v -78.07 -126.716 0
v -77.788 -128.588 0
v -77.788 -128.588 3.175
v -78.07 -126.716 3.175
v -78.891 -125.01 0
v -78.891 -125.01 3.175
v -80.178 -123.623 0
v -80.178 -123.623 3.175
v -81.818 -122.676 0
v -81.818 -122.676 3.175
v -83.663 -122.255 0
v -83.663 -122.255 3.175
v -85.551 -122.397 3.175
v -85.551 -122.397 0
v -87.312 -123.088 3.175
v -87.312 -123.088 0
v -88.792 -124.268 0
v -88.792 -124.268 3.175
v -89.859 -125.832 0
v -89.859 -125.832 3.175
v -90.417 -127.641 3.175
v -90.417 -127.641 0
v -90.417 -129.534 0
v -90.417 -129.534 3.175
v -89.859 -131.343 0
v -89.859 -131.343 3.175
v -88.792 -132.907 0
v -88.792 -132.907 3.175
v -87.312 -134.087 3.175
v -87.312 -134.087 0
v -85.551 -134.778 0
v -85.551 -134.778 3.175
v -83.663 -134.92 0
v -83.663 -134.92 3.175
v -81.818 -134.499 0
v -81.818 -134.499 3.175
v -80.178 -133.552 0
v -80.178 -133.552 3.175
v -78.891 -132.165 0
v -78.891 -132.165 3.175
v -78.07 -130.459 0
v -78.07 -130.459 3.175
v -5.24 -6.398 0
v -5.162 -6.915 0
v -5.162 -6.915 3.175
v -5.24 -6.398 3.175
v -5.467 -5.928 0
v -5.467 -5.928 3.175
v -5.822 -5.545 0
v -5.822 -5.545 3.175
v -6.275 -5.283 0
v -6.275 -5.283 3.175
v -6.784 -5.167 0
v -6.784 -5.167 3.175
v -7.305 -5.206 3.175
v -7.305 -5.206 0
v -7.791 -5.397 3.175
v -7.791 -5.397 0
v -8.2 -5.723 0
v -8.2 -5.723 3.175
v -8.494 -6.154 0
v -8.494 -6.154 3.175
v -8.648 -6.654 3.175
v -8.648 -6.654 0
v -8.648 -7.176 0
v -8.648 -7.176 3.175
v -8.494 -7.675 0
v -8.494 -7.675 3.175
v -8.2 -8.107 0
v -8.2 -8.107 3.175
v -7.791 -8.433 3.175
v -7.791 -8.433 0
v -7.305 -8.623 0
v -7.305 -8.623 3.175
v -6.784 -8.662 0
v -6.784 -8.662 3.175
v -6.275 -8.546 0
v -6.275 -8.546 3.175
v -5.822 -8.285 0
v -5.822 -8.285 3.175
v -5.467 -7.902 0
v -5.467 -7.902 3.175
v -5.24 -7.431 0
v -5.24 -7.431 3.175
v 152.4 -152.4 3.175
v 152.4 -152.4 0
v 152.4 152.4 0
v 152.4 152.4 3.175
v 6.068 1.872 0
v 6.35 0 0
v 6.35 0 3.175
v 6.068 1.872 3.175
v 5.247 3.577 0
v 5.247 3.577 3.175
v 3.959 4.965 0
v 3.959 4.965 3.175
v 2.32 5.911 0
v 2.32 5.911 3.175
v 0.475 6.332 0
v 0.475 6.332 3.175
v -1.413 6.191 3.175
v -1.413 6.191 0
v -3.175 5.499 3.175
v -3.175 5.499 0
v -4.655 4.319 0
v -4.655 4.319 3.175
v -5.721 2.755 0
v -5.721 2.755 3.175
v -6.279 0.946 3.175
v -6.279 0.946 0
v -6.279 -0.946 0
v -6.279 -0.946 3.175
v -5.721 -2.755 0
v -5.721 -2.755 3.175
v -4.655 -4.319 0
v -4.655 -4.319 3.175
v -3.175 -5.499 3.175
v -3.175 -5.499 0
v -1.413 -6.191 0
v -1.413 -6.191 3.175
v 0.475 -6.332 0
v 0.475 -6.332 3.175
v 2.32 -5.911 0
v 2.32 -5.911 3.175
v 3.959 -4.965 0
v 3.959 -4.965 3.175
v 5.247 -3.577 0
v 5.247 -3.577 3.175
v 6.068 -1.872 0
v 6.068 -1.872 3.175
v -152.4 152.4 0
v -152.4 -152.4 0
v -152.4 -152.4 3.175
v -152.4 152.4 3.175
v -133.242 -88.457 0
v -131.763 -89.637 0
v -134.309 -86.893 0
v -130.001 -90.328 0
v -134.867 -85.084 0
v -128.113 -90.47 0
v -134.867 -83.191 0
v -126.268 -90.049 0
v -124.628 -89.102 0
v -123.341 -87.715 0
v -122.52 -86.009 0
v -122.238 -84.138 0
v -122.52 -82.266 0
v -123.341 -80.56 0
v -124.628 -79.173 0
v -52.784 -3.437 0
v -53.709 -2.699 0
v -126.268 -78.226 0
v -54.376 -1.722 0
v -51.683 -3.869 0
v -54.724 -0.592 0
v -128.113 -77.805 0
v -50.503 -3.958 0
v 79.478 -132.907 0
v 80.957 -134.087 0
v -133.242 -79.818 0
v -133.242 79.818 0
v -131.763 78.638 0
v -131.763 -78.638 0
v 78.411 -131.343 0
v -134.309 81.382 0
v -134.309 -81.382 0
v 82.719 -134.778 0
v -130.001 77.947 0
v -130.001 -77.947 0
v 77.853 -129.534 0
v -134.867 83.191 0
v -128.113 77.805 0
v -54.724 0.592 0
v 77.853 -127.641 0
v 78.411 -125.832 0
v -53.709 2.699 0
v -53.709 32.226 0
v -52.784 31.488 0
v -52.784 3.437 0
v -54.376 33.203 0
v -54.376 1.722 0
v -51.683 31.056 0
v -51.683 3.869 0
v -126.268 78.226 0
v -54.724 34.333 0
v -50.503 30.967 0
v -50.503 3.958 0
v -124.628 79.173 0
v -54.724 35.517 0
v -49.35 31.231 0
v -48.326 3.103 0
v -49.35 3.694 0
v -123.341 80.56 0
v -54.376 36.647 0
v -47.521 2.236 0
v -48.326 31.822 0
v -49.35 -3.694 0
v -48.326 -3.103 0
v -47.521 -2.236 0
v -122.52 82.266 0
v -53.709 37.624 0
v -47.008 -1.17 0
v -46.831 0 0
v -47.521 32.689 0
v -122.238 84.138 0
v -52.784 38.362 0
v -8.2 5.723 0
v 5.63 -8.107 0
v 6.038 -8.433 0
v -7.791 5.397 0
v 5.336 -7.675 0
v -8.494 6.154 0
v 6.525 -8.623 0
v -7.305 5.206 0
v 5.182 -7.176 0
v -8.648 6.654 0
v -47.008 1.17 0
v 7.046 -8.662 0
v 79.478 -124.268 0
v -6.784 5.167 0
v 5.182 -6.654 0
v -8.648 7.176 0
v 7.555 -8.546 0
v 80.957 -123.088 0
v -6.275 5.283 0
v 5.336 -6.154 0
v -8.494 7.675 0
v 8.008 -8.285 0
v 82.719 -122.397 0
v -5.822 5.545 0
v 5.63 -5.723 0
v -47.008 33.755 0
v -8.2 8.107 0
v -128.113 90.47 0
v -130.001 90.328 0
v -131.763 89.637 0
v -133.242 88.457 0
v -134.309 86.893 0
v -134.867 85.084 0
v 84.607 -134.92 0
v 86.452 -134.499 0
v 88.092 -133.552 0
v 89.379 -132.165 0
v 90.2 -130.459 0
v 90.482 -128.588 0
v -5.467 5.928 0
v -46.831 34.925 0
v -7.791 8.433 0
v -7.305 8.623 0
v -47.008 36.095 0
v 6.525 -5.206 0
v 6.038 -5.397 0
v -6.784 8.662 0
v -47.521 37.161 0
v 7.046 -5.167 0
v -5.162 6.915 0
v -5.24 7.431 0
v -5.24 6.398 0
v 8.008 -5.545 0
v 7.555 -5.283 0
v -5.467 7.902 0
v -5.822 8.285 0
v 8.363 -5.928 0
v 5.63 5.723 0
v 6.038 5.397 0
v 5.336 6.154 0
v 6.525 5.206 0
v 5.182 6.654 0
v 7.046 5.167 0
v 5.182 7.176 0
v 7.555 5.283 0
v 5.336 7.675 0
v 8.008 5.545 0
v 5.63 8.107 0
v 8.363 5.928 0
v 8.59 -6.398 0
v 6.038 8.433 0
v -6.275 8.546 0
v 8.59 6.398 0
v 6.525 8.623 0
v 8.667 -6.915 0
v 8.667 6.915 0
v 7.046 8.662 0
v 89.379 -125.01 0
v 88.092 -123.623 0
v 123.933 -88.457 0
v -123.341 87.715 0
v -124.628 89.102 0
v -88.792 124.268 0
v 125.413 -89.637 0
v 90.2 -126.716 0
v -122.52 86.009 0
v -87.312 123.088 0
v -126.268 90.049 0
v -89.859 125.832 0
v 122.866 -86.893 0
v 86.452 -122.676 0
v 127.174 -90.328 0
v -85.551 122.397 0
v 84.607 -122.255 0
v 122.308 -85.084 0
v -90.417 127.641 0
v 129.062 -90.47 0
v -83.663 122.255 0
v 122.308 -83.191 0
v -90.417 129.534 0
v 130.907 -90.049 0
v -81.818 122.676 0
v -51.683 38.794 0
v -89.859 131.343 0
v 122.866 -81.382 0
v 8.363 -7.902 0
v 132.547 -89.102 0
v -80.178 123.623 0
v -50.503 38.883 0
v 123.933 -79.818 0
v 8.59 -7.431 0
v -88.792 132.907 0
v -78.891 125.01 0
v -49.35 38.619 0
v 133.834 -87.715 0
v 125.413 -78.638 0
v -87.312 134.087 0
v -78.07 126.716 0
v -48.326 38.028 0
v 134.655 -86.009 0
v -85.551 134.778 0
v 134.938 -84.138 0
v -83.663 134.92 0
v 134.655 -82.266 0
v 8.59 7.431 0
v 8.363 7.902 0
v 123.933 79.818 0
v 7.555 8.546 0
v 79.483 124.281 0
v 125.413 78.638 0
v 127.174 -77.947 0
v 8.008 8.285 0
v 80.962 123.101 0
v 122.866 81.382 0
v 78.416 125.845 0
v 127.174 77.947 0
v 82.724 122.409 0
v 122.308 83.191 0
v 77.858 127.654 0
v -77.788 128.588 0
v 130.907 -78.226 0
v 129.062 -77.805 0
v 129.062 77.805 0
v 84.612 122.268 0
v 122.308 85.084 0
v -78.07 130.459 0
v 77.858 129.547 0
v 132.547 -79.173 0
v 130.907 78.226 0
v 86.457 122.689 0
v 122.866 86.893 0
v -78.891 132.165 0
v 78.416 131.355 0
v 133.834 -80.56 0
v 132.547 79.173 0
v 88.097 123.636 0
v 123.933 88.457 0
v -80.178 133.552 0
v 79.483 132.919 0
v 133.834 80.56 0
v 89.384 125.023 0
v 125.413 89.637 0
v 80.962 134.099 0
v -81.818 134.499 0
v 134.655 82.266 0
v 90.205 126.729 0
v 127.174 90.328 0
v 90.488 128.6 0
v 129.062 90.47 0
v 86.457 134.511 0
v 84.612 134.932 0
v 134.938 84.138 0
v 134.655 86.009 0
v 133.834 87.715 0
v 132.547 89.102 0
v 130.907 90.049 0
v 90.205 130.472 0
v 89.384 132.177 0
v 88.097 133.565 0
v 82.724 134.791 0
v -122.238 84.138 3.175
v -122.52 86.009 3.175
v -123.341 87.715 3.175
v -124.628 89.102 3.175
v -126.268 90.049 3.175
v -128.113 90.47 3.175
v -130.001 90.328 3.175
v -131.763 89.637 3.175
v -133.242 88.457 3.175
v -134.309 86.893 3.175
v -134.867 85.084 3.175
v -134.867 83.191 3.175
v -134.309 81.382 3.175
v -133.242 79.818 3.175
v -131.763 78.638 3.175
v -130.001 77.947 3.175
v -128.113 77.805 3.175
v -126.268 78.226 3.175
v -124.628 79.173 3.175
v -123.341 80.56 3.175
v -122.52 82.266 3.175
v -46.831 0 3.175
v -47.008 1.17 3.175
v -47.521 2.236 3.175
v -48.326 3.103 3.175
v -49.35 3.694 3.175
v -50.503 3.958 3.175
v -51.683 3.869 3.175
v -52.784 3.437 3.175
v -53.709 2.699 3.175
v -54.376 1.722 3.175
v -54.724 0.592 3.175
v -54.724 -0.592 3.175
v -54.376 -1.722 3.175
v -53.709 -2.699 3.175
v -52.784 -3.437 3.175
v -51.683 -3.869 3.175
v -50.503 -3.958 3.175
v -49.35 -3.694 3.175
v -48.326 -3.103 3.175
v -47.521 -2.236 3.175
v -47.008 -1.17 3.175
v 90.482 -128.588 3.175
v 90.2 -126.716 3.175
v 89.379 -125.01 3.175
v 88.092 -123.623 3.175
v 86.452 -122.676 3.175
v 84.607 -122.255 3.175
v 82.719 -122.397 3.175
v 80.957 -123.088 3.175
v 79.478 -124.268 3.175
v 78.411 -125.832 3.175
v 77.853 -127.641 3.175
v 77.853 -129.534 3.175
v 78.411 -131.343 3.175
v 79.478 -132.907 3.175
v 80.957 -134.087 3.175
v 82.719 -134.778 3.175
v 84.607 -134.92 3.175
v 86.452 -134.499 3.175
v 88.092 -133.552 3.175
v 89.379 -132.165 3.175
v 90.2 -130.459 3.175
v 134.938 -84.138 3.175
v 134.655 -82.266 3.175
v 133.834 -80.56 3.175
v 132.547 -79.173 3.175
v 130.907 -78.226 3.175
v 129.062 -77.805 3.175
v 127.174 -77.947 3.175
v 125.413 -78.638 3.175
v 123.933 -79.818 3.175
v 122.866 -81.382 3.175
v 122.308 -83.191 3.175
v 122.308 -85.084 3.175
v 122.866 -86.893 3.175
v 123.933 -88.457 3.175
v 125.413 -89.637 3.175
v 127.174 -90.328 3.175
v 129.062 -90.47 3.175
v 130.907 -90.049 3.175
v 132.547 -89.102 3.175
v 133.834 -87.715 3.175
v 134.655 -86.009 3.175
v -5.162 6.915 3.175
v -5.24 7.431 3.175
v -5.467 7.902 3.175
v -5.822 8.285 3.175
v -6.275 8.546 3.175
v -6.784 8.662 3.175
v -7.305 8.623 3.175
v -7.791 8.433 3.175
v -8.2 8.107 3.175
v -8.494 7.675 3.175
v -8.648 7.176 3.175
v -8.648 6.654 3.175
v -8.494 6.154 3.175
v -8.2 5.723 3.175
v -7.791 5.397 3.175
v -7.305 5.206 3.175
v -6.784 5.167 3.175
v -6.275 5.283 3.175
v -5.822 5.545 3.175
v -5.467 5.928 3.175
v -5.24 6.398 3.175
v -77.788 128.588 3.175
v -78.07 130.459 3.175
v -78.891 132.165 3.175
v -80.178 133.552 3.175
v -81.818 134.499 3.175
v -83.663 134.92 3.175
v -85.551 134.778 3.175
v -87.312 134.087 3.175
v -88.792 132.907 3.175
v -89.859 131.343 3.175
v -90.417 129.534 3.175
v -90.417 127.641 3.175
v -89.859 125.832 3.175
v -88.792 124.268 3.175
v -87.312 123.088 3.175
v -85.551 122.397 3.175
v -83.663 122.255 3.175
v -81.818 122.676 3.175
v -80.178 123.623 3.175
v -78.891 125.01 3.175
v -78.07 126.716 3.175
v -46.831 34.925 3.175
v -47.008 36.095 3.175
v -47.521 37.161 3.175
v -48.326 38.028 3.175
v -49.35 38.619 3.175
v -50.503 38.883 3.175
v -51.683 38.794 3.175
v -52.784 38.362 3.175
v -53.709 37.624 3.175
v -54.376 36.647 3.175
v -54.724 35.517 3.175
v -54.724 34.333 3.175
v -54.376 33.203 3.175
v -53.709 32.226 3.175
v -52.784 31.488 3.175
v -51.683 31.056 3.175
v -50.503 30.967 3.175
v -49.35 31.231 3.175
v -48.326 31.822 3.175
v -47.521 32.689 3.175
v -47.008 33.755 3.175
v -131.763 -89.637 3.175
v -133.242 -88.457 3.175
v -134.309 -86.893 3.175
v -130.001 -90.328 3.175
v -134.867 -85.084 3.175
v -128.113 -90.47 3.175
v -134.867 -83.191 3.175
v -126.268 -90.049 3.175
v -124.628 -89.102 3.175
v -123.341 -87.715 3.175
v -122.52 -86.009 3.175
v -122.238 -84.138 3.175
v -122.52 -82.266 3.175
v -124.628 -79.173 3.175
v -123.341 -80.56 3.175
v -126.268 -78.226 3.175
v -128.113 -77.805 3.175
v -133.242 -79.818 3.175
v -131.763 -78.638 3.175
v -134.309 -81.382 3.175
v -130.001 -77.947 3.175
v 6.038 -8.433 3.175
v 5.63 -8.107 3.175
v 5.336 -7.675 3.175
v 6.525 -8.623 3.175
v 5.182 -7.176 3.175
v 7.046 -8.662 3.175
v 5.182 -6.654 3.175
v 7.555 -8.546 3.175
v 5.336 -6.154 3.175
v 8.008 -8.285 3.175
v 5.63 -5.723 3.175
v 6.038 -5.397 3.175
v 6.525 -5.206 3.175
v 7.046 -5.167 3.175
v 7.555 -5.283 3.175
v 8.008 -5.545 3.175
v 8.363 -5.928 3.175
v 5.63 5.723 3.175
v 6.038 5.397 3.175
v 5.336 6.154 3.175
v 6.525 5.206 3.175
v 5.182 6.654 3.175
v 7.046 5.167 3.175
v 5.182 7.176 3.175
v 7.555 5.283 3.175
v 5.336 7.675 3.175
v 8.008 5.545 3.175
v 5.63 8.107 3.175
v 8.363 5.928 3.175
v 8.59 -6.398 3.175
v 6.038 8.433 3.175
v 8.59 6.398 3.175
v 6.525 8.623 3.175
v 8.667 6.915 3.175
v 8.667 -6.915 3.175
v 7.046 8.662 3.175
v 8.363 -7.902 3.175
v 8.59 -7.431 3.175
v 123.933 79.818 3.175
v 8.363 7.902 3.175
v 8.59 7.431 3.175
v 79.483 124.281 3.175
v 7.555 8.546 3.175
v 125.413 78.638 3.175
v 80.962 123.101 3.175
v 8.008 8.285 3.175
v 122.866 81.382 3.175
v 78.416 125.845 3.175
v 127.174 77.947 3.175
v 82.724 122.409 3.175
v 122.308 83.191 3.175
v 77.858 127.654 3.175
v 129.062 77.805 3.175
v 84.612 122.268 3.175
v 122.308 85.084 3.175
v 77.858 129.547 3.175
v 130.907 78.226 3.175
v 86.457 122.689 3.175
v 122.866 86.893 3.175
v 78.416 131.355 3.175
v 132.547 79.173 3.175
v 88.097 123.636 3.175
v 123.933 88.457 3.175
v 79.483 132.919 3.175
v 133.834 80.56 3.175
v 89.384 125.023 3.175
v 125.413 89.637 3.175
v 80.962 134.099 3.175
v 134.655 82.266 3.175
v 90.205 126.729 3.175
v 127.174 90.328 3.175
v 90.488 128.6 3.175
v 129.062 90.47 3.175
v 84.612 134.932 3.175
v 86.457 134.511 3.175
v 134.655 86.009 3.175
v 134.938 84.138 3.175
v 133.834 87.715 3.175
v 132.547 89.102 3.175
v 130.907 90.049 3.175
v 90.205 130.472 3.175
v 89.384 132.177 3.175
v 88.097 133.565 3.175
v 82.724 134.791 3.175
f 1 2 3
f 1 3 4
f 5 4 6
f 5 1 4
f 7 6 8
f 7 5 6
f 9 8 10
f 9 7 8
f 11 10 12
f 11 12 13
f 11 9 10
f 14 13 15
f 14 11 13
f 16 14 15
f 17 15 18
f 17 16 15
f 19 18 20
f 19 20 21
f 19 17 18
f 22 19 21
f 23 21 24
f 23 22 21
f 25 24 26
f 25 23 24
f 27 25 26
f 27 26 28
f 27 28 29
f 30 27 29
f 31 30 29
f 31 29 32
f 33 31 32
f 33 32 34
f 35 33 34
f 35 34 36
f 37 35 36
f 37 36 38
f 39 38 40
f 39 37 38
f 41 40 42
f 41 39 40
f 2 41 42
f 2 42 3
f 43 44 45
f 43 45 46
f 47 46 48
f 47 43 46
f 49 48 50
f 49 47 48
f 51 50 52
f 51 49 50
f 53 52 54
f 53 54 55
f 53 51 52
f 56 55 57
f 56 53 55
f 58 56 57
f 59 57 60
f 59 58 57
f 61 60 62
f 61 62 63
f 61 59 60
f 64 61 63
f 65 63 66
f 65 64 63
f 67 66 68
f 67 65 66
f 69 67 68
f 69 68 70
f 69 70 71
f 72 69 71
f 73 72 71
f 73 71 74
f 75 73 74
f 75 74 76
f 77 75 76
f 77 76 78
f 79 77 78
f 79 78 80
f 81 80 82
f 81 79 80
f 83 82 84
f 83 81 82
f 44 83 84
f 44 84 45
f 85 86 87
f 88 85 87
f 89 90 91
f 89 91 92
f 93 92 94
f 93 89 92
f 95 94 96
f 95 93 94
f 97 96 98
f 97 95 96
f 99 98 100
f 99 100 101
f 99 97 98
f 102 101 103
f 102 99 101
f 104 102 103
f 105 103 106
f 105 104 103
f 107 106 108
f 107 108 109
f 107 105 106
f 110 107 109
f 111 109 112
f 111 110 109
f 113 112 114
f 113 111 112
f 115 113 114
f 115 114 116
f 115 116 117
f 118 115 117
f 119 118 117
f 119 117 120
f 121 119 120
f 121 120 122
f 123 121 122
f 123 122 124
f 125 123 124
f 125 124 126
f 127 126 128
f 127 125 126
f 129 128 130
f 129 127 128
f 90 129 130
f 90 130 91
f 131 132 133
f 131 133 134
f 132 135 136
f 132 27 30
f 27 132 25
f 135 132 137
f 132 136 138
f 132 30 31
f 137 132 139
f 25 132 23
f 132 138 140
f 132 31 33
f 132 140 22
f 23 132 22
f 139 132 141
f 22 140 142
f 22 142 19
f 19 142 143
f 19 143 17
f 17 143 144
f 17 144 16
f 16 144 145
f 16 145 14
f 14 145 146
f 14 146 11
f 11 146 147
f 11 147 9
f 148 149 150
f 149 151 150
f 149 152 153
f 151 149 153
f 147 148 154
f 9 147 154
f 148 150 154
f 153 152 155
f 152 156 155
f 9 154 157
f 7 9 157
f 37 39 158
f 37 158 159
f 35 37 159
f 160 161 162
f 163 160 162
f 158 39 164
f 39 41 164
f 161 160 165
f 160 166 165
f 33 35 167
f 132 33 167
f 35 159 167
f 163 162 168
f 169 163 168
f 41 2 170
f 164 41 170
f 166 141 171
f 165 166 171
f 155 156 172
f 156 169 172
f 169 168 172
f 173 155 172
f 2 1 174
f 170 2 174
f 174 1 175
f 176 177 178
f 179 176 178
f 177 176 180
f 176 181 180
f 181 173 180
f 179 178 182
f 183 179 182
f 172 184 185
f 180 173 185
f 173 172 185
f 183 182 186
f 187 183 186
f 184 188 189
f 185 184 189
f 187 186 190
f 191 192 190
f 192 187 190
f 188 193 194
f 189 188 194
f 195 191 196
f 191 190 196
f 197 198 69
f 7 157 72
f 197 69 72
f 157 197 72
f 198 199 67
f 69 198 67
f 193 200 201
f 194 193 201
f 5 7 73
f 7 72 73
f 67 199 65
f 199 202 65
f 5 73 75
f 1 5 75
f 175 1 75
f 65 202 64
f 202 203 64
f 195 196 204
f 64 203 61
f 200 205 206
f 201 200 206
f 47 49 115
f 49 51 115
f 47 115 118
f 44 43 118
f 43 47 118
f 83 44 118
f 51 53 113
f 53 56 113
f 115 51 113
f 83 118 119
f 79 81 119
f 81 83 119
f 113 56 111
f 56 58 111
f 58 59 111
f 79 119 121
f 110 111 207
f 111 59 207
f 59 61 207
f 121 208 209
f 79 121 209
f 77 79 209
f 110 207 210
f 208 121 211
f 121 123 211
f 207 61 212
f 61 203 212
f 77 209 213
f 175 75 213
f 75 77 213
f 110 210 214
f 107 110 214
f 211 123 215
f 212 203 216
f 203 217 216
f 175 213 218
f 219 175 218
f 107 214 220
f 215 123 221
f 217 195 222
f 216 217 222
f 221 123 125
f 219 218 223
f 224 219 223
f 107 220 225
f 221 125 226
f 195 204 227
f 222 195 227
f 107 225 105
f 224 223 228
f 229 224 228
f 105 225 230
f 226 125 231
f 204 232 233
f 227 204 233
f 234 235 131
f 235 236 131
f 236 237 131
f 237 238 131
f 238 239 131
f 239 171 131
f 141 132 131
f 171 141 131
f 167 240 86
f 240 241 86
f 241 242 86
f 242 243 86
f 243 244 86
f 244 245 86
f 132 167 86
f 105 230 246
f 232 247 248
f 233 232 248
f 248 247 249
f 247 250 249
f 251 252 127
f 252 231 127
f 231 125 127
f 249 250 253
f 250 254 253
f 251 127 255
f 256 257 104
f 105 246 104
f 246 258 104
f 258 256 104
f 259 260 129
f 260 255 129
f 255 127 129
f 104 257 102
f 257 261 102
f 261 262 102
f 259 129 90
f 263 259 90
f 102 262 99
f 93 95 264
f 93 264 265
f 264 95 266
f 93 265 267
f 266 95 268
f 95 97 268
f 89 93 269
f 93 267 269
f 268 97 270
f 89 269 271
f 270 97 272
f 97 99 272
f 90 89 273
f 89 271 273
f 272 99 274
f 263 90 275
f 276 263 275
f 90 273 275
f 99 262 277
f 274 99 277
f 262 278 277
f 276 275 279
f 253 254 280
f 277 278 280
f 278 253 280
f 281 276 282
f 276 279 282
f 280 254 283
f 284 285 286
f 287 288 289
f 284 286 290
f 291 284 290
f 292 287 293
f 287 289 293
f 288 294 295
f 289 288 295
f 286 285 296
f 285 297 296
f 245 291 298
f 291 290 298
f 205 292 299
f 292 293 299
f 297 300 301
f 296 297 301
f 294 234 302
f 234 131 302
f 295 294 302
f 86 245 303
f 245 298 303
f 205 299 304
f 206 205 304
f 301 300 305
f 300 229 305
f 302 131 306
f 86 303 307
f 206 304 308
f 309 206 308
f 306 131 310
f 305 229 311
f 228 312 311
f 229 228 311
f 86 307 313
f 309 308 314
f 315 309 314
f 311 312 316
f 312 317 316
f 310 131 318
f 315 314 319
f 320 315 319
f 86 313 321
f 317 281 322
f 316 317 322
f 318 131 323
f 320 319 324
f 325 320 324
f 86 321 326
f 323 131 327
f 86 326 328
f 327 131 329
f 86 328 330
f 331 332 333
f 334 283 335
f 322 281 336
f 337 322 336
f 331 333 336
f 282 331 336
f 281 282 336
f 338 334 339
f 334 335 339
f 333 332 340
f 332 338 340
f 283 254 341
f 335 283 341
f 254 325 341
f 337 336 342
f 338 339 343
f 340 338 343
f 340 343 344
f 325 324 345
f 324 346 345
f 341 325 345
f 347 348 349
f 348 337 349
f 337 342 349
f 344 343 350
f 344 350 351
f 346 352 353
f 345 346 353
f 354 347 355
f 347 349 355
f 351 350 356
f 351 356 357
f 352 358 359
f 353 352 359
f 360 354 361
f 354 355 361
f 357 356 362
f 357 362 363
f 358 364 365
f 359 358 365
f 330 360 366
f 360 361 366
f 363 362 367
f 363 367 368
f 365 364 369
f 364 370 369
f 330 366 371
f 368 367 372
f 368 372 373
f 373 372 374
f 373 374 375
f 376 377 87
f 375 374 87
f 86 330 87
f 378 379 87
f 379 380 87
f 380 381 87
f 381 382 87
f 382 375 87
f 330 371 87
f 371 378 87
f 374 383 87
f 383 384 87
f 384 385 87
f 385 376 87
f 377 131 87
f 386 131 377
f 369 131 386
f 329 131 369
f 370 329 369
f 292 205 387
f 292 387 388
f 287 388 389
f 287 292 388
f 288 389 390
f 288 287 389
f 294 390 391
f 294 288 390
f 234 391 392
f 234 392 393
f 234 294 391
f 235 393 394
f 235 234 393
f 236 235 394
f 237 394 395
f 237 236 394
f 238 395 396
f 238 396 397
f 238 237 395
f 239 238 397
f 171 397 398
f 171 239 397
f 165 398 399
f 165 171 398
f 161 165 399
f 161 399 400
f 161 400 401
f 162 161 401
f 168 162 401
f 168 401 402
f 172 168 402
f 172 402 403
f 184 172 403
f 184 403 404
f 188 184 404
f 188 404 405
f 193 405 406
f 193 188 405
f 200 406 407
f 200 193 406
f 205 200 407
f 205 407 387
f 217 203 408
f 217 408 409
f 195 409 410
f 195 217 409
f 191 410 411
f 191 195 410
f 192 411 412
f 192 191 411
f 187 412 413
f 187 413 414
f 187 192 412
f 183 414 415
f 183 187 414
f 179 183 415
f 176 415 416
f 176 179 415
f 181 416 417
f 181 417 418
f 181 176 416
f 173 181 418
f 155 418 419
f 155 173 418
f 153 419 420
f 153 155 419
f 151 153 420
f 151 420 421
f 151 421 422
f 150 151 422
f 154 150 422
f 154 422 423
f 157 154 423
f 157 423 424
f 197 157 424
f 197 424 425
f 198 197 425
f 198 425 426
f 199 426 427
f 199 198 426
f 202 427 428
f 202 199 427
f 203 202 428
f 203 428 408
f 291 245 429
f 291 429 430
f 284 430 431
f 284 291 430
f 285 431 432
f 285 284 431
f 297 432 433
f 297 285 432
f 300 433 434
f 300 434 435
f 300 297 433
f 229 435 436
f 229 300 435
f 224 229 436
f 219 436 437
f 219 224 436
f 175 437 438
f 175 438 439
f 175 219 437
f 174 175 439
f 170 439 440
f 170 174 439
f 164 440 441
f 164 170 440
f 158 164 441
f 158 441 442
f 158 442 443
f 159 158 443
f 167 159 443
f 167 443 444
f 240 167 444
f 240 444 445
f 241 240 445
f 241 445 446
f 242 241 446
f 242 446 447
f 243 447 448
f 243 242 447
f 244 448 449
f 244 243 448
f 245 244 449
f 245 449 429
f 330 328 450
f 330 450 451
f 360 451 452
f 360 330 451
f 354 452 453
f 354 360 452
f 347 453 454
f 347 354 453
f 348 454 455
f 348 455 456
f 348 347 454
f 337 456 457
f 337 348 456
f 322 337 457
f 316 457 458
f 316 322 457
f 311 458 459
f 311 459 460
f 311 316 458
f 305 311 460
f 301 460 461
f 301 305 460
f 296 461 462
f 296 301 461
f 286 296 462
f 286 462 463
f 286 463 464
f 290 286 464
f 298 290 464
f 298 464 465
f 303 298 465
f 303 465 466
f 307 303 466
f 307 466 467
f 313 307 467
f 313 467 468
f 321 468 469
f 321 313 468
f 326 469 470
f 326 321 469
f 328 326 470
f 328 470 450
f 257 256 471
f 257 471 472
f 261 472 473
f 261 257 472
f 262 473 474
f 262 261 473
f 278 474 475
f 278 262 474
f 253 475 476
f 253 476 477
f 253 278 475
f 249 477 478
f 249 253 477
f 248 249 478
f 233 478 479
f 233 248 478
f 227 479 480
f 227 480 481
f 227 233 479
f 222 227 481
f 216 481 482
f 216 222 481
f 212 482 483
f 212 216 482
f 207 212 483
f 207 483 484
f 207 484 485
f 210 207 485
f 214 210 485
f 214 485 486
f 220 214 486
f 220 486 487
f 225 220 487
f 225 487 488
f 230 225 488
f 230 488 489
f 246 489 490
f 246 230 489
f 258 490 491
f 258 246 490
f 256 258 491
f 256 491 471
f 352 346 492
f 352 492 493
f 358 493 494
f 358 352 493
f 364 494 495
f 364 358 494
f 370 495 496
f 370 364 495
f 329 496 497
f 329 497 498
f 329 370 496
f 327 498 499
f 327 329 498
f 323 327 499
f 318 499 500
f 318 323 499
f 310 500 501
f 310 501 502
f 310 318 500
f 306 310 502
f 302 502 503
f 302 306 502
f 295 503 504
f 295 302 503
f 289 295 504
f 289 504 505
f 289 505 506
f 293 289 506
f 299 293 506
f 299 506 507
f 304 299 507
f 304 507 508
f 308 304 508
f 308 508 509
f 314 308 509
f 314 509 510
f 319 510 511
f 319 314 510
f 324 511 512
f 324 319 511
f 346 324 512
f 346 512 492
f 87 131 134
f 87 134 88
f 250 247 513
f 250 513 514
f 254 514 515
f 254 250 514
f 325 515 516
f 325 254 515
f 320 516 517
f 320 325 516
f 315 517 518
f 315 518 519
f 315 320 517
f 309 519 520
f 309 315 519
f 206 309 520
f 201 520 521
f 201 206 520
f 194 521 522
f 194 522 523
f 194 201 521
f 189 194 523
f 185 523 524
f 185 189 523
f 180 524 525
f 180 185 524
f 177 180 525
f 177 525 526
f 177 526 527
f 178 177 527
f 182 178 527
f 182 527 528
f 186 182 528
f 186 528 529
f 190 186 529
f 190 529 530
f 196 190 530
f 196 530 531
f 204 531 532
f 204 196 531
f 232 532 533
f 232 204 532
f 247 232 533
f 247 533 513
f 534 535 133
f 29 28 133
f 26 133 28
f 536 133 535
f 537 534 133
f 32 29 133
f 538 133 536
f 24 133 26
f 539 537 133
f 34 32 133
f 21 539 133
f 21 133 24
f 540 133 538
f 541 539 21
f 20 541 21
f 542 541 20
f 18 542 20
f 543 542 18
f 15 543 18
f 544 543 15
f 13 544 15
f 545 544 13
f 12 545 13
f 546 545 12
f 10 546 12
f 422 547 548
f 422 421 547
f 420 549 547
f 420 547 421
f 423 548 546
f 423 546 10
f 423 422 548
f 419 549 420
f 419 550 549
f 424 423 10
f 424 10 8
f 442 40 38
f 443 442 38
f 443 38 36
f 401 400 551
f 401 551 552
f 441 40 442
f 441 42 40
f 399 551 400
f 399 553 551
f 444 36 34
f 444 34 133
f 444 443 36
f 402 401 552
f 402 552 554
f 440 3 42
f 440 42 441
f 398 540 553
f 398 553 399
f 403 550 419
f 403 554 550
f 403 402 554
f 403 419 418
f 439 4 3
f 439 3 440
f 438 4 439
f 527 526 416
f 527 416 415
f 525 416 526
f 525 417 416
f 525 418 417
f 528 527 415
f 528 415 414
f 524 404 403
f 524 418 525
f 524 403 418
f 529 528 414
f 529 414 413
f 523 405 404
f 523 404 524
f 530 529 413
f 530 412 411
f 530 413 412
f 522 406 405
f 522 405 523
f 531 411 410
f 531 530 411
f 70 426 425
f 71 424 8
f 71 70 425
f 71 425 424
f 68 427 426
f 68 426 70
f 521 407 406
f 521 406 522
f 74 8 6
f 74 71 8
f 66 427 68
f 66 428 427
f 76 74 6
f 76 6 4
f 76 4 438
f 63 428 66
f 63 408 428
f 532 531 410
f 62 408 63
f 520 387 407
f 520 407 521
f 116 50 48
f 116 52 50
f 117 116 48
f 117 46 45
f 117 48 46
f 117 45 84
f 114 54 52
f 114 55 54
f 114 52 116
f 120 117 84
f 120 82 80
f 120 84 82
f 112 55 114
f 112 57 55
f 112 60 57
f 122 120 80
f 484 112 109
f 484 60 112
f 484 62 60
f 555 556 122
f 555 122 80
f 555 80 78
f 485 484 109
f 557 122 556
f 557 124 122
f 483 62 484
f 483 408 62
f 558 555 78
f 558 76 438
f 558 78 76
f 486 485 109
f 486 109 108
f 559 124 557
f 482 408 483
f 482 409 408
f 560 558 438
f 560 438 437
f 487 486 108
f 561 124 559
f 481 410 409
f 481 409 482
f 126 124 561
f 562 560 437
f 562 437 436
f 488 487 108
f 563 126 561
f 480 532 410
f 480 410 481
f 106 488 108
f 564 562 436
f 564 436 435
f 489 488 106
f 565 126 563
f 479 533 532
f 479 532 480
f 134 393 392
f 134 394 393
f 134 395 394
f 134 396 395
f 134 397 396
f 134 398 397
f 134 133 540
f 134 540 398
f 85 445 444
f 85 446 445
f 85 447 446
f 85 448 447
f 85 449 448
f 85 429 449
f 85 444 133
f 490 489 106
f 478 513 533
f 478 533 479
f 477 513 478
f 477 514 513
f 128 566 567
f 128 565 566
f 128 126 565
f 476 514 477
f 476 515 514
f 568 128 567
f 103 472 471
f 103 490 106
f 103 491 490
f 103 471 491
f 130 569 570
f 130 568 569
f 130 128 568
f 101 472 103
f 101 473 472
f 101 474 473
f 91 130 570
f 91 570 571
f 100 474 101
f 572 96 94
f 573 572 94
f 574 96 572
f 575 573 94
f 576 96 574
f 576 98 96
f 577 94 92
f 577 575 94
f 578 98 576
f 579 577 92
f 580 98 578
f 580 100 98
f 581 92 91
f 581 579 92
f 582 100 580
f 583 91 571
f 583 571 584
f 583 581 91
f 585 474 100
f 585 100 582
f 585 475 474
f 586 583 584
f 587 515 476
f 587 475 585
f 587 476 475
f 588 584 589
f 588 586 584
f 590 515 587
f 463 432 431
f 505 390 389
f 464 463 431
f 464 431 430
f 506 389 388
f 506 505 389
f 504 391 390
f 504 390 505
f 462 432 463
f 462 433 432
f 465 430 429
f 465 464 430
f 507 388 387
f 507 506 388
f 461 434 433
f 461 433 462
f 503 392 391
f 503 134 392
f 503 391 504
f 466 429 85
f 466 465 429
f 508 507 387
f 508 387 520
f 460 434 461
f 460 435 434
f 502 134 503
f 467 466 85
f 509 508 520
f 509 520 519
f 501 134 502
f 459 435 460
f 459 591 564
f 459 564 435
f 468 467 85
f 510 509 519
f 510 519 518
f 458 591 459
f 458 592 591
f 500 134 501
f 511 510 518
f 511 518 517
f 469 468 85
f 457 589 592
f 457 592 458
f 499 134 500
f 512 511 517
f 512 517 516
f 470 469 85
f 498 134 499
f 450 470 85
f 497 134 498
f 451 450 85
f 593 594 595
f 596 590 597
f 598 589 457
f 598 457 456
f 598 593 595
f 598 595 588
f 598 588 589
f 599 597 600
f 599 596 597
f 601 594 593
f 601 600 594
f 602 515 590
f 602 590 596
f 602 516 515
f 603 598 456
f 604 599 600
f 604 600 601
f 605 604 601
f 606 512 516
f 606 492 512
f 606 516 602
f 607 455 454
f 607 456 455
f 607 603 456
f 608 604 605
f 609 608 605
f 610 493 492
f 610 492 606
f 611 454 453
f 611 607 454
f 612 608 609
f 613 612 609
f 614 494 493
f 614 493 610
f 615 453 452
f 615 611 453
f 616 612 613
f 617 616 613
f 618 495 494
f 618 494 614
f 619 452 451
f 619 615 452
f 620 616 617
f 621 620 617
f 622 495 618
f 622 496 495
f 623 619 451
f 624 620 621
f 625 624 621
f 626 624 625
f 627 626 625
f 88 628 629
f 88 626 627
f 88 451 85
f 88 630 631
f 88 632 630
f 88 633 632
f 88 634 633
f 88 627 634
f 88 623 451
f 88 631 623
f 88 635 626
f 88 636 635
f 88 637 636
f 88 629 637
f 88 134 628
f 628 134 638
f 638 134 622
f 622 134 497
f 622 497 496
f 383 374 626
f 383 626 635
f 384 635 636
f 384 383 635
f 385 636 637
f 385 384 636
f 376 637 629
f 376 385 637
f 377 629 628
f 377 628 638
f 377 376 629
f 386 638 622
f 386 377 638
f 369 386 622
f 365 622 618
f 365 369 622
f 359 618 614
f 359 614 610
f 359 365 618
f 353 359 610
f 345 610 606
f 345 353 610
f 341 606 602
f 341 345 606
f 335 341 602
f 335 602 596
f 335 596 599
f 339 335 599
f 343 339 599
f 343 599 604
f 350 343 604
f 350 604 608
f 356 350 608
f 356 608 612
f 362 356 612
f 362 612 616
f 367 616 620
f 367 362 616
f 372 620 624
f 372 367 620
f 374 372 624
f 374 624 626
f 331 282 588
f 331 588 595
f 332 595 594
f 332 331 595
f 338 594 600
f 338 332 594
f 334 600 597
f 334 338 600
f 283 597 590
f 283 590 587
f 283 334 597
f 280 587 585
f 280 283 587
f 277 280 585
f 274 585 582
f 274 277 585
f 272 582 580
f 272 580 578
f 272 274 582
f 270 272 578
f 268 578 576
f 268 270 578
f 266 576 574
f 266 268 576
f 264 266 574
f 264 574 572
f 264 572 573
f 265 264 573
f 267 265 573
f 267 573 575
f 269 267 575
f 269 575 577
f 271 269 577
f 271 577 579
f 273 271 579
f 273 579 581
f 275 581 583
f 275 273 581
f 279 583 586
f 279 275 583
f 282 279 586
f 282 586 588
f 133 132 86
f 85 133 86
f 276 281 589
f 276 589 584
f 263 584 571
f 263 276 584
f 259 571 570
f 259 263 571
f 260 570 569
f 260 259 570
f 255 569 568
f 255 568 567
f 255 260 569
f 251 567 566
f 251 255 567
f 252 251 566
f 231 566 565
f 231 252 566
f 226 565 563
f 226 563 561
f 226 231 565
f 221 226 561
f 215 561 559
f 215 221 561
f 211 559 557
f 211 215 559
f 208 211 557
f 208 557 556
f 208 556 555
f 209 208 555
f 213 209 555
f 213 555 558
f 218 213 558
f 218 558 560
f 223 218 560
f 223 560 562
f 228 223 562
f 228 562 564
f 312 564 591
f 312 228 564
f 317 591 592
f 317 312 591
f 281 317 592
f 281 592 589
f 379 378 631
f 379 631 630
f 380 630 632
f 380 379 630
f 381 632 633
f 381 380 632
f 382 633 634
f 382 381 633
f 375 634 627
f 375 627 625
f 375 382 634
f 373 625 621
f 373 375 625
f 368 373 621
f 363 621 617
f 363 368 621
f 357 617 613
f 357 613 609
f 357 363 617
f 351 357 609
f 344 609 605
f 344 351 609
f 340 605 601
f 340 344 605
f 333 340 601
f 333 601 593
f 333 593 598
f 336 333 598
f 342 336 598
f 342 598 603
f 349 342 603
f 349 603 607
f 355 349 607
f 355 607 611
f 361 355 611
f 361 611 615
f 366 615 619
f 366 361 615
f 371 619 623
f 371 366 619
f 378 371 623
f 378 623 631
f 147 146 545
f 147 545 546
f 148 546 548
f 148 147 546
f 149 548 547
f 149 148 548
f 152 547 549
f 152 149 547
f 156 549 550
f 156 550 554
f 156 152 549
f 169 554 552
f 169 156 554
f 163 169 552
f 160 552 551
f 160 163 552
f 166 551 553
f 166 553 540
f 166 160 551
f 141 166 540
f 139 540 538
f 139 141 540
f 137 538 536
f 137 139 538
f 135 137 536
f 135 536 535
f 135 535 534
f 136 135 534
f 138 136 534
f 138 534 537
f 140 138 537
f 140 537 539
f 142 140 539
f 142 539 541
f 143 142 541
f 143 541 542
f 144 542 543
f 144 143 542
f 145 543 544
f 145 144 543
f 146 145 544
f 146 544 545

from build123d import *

# Parameters (mm, degrees)
F0_W     = 304.8
F0_H     = 304.8
F0_R     = 6.35
F0_R_2   = 1.7526
F0_R_3   = 3.96875
F1_DEPTH = 3.175


with BuildPart() as f1:
    # F0 (on Top) → F1 (new body)
    with BuildSketch(Plane.XY):
        Rectangle(F0_W, F0_H)
        with Locations((-84.1375, -128.5875)):
            Circle(F0_R, mode=Mode.SUBTRACT)
        with Locations((-128.5875, -84.1375)):
            Circle(F0_R, mode=Mode.SUBTRACT)
        with Locations((-6.914797, -6.914797)):
            Circle(F0_R_2, mode=Mode.SUBTRACT)
        with Locations((84.13242, -128.5875)):
            Circle(F0_R, mode=Mode.SUBTRACT)
        with Locations((128.5875, -84.1375)):
            Circle(F0_R, mode=Mode.SUBTRACT)
        with Locations((6.914797, -6.914797)):
            Circle(F0_R_2, mode=Mode.SUBTRACT)
        with Locations((-50.8, 0)):
            Circle(F0_R_3, mode=Mode.SUBTRACT)
        with Locations((-50.8, 34.925)):
            Circle(F0_R_3, mode=Mode.SUBTRACT)
        with Locations((-6.914797, 6.914797)):
            Circle(F0_R_2, mode=Mode.SUBTRACT)
        with Locations((-128.5875, 84.1375)):
            Circle(F0_R, mode=Mode.SUBTRACT)
        with Locations((-84.1375, 128.5875)):
            Circle(F0_R, mode=Mode.SUBTRACT)
        Circle(F0_R, mode=Mode.SUBTRACT)
        with Locations((6.914797, 6.914797)):
            Circle(F0_R_2, mode=Mode.SUBTRACT)
        with Locations((128.5875, 84.1375)):
            Circle(F0_R, mode=Mode.SUBTRACT)
        with Locations((84.1375, 128.6002)):
            Circle(F0_R, mode=Mode.SUBTRACT)
    extrude(amount=F1_DEPTH)


solid = f1.part
